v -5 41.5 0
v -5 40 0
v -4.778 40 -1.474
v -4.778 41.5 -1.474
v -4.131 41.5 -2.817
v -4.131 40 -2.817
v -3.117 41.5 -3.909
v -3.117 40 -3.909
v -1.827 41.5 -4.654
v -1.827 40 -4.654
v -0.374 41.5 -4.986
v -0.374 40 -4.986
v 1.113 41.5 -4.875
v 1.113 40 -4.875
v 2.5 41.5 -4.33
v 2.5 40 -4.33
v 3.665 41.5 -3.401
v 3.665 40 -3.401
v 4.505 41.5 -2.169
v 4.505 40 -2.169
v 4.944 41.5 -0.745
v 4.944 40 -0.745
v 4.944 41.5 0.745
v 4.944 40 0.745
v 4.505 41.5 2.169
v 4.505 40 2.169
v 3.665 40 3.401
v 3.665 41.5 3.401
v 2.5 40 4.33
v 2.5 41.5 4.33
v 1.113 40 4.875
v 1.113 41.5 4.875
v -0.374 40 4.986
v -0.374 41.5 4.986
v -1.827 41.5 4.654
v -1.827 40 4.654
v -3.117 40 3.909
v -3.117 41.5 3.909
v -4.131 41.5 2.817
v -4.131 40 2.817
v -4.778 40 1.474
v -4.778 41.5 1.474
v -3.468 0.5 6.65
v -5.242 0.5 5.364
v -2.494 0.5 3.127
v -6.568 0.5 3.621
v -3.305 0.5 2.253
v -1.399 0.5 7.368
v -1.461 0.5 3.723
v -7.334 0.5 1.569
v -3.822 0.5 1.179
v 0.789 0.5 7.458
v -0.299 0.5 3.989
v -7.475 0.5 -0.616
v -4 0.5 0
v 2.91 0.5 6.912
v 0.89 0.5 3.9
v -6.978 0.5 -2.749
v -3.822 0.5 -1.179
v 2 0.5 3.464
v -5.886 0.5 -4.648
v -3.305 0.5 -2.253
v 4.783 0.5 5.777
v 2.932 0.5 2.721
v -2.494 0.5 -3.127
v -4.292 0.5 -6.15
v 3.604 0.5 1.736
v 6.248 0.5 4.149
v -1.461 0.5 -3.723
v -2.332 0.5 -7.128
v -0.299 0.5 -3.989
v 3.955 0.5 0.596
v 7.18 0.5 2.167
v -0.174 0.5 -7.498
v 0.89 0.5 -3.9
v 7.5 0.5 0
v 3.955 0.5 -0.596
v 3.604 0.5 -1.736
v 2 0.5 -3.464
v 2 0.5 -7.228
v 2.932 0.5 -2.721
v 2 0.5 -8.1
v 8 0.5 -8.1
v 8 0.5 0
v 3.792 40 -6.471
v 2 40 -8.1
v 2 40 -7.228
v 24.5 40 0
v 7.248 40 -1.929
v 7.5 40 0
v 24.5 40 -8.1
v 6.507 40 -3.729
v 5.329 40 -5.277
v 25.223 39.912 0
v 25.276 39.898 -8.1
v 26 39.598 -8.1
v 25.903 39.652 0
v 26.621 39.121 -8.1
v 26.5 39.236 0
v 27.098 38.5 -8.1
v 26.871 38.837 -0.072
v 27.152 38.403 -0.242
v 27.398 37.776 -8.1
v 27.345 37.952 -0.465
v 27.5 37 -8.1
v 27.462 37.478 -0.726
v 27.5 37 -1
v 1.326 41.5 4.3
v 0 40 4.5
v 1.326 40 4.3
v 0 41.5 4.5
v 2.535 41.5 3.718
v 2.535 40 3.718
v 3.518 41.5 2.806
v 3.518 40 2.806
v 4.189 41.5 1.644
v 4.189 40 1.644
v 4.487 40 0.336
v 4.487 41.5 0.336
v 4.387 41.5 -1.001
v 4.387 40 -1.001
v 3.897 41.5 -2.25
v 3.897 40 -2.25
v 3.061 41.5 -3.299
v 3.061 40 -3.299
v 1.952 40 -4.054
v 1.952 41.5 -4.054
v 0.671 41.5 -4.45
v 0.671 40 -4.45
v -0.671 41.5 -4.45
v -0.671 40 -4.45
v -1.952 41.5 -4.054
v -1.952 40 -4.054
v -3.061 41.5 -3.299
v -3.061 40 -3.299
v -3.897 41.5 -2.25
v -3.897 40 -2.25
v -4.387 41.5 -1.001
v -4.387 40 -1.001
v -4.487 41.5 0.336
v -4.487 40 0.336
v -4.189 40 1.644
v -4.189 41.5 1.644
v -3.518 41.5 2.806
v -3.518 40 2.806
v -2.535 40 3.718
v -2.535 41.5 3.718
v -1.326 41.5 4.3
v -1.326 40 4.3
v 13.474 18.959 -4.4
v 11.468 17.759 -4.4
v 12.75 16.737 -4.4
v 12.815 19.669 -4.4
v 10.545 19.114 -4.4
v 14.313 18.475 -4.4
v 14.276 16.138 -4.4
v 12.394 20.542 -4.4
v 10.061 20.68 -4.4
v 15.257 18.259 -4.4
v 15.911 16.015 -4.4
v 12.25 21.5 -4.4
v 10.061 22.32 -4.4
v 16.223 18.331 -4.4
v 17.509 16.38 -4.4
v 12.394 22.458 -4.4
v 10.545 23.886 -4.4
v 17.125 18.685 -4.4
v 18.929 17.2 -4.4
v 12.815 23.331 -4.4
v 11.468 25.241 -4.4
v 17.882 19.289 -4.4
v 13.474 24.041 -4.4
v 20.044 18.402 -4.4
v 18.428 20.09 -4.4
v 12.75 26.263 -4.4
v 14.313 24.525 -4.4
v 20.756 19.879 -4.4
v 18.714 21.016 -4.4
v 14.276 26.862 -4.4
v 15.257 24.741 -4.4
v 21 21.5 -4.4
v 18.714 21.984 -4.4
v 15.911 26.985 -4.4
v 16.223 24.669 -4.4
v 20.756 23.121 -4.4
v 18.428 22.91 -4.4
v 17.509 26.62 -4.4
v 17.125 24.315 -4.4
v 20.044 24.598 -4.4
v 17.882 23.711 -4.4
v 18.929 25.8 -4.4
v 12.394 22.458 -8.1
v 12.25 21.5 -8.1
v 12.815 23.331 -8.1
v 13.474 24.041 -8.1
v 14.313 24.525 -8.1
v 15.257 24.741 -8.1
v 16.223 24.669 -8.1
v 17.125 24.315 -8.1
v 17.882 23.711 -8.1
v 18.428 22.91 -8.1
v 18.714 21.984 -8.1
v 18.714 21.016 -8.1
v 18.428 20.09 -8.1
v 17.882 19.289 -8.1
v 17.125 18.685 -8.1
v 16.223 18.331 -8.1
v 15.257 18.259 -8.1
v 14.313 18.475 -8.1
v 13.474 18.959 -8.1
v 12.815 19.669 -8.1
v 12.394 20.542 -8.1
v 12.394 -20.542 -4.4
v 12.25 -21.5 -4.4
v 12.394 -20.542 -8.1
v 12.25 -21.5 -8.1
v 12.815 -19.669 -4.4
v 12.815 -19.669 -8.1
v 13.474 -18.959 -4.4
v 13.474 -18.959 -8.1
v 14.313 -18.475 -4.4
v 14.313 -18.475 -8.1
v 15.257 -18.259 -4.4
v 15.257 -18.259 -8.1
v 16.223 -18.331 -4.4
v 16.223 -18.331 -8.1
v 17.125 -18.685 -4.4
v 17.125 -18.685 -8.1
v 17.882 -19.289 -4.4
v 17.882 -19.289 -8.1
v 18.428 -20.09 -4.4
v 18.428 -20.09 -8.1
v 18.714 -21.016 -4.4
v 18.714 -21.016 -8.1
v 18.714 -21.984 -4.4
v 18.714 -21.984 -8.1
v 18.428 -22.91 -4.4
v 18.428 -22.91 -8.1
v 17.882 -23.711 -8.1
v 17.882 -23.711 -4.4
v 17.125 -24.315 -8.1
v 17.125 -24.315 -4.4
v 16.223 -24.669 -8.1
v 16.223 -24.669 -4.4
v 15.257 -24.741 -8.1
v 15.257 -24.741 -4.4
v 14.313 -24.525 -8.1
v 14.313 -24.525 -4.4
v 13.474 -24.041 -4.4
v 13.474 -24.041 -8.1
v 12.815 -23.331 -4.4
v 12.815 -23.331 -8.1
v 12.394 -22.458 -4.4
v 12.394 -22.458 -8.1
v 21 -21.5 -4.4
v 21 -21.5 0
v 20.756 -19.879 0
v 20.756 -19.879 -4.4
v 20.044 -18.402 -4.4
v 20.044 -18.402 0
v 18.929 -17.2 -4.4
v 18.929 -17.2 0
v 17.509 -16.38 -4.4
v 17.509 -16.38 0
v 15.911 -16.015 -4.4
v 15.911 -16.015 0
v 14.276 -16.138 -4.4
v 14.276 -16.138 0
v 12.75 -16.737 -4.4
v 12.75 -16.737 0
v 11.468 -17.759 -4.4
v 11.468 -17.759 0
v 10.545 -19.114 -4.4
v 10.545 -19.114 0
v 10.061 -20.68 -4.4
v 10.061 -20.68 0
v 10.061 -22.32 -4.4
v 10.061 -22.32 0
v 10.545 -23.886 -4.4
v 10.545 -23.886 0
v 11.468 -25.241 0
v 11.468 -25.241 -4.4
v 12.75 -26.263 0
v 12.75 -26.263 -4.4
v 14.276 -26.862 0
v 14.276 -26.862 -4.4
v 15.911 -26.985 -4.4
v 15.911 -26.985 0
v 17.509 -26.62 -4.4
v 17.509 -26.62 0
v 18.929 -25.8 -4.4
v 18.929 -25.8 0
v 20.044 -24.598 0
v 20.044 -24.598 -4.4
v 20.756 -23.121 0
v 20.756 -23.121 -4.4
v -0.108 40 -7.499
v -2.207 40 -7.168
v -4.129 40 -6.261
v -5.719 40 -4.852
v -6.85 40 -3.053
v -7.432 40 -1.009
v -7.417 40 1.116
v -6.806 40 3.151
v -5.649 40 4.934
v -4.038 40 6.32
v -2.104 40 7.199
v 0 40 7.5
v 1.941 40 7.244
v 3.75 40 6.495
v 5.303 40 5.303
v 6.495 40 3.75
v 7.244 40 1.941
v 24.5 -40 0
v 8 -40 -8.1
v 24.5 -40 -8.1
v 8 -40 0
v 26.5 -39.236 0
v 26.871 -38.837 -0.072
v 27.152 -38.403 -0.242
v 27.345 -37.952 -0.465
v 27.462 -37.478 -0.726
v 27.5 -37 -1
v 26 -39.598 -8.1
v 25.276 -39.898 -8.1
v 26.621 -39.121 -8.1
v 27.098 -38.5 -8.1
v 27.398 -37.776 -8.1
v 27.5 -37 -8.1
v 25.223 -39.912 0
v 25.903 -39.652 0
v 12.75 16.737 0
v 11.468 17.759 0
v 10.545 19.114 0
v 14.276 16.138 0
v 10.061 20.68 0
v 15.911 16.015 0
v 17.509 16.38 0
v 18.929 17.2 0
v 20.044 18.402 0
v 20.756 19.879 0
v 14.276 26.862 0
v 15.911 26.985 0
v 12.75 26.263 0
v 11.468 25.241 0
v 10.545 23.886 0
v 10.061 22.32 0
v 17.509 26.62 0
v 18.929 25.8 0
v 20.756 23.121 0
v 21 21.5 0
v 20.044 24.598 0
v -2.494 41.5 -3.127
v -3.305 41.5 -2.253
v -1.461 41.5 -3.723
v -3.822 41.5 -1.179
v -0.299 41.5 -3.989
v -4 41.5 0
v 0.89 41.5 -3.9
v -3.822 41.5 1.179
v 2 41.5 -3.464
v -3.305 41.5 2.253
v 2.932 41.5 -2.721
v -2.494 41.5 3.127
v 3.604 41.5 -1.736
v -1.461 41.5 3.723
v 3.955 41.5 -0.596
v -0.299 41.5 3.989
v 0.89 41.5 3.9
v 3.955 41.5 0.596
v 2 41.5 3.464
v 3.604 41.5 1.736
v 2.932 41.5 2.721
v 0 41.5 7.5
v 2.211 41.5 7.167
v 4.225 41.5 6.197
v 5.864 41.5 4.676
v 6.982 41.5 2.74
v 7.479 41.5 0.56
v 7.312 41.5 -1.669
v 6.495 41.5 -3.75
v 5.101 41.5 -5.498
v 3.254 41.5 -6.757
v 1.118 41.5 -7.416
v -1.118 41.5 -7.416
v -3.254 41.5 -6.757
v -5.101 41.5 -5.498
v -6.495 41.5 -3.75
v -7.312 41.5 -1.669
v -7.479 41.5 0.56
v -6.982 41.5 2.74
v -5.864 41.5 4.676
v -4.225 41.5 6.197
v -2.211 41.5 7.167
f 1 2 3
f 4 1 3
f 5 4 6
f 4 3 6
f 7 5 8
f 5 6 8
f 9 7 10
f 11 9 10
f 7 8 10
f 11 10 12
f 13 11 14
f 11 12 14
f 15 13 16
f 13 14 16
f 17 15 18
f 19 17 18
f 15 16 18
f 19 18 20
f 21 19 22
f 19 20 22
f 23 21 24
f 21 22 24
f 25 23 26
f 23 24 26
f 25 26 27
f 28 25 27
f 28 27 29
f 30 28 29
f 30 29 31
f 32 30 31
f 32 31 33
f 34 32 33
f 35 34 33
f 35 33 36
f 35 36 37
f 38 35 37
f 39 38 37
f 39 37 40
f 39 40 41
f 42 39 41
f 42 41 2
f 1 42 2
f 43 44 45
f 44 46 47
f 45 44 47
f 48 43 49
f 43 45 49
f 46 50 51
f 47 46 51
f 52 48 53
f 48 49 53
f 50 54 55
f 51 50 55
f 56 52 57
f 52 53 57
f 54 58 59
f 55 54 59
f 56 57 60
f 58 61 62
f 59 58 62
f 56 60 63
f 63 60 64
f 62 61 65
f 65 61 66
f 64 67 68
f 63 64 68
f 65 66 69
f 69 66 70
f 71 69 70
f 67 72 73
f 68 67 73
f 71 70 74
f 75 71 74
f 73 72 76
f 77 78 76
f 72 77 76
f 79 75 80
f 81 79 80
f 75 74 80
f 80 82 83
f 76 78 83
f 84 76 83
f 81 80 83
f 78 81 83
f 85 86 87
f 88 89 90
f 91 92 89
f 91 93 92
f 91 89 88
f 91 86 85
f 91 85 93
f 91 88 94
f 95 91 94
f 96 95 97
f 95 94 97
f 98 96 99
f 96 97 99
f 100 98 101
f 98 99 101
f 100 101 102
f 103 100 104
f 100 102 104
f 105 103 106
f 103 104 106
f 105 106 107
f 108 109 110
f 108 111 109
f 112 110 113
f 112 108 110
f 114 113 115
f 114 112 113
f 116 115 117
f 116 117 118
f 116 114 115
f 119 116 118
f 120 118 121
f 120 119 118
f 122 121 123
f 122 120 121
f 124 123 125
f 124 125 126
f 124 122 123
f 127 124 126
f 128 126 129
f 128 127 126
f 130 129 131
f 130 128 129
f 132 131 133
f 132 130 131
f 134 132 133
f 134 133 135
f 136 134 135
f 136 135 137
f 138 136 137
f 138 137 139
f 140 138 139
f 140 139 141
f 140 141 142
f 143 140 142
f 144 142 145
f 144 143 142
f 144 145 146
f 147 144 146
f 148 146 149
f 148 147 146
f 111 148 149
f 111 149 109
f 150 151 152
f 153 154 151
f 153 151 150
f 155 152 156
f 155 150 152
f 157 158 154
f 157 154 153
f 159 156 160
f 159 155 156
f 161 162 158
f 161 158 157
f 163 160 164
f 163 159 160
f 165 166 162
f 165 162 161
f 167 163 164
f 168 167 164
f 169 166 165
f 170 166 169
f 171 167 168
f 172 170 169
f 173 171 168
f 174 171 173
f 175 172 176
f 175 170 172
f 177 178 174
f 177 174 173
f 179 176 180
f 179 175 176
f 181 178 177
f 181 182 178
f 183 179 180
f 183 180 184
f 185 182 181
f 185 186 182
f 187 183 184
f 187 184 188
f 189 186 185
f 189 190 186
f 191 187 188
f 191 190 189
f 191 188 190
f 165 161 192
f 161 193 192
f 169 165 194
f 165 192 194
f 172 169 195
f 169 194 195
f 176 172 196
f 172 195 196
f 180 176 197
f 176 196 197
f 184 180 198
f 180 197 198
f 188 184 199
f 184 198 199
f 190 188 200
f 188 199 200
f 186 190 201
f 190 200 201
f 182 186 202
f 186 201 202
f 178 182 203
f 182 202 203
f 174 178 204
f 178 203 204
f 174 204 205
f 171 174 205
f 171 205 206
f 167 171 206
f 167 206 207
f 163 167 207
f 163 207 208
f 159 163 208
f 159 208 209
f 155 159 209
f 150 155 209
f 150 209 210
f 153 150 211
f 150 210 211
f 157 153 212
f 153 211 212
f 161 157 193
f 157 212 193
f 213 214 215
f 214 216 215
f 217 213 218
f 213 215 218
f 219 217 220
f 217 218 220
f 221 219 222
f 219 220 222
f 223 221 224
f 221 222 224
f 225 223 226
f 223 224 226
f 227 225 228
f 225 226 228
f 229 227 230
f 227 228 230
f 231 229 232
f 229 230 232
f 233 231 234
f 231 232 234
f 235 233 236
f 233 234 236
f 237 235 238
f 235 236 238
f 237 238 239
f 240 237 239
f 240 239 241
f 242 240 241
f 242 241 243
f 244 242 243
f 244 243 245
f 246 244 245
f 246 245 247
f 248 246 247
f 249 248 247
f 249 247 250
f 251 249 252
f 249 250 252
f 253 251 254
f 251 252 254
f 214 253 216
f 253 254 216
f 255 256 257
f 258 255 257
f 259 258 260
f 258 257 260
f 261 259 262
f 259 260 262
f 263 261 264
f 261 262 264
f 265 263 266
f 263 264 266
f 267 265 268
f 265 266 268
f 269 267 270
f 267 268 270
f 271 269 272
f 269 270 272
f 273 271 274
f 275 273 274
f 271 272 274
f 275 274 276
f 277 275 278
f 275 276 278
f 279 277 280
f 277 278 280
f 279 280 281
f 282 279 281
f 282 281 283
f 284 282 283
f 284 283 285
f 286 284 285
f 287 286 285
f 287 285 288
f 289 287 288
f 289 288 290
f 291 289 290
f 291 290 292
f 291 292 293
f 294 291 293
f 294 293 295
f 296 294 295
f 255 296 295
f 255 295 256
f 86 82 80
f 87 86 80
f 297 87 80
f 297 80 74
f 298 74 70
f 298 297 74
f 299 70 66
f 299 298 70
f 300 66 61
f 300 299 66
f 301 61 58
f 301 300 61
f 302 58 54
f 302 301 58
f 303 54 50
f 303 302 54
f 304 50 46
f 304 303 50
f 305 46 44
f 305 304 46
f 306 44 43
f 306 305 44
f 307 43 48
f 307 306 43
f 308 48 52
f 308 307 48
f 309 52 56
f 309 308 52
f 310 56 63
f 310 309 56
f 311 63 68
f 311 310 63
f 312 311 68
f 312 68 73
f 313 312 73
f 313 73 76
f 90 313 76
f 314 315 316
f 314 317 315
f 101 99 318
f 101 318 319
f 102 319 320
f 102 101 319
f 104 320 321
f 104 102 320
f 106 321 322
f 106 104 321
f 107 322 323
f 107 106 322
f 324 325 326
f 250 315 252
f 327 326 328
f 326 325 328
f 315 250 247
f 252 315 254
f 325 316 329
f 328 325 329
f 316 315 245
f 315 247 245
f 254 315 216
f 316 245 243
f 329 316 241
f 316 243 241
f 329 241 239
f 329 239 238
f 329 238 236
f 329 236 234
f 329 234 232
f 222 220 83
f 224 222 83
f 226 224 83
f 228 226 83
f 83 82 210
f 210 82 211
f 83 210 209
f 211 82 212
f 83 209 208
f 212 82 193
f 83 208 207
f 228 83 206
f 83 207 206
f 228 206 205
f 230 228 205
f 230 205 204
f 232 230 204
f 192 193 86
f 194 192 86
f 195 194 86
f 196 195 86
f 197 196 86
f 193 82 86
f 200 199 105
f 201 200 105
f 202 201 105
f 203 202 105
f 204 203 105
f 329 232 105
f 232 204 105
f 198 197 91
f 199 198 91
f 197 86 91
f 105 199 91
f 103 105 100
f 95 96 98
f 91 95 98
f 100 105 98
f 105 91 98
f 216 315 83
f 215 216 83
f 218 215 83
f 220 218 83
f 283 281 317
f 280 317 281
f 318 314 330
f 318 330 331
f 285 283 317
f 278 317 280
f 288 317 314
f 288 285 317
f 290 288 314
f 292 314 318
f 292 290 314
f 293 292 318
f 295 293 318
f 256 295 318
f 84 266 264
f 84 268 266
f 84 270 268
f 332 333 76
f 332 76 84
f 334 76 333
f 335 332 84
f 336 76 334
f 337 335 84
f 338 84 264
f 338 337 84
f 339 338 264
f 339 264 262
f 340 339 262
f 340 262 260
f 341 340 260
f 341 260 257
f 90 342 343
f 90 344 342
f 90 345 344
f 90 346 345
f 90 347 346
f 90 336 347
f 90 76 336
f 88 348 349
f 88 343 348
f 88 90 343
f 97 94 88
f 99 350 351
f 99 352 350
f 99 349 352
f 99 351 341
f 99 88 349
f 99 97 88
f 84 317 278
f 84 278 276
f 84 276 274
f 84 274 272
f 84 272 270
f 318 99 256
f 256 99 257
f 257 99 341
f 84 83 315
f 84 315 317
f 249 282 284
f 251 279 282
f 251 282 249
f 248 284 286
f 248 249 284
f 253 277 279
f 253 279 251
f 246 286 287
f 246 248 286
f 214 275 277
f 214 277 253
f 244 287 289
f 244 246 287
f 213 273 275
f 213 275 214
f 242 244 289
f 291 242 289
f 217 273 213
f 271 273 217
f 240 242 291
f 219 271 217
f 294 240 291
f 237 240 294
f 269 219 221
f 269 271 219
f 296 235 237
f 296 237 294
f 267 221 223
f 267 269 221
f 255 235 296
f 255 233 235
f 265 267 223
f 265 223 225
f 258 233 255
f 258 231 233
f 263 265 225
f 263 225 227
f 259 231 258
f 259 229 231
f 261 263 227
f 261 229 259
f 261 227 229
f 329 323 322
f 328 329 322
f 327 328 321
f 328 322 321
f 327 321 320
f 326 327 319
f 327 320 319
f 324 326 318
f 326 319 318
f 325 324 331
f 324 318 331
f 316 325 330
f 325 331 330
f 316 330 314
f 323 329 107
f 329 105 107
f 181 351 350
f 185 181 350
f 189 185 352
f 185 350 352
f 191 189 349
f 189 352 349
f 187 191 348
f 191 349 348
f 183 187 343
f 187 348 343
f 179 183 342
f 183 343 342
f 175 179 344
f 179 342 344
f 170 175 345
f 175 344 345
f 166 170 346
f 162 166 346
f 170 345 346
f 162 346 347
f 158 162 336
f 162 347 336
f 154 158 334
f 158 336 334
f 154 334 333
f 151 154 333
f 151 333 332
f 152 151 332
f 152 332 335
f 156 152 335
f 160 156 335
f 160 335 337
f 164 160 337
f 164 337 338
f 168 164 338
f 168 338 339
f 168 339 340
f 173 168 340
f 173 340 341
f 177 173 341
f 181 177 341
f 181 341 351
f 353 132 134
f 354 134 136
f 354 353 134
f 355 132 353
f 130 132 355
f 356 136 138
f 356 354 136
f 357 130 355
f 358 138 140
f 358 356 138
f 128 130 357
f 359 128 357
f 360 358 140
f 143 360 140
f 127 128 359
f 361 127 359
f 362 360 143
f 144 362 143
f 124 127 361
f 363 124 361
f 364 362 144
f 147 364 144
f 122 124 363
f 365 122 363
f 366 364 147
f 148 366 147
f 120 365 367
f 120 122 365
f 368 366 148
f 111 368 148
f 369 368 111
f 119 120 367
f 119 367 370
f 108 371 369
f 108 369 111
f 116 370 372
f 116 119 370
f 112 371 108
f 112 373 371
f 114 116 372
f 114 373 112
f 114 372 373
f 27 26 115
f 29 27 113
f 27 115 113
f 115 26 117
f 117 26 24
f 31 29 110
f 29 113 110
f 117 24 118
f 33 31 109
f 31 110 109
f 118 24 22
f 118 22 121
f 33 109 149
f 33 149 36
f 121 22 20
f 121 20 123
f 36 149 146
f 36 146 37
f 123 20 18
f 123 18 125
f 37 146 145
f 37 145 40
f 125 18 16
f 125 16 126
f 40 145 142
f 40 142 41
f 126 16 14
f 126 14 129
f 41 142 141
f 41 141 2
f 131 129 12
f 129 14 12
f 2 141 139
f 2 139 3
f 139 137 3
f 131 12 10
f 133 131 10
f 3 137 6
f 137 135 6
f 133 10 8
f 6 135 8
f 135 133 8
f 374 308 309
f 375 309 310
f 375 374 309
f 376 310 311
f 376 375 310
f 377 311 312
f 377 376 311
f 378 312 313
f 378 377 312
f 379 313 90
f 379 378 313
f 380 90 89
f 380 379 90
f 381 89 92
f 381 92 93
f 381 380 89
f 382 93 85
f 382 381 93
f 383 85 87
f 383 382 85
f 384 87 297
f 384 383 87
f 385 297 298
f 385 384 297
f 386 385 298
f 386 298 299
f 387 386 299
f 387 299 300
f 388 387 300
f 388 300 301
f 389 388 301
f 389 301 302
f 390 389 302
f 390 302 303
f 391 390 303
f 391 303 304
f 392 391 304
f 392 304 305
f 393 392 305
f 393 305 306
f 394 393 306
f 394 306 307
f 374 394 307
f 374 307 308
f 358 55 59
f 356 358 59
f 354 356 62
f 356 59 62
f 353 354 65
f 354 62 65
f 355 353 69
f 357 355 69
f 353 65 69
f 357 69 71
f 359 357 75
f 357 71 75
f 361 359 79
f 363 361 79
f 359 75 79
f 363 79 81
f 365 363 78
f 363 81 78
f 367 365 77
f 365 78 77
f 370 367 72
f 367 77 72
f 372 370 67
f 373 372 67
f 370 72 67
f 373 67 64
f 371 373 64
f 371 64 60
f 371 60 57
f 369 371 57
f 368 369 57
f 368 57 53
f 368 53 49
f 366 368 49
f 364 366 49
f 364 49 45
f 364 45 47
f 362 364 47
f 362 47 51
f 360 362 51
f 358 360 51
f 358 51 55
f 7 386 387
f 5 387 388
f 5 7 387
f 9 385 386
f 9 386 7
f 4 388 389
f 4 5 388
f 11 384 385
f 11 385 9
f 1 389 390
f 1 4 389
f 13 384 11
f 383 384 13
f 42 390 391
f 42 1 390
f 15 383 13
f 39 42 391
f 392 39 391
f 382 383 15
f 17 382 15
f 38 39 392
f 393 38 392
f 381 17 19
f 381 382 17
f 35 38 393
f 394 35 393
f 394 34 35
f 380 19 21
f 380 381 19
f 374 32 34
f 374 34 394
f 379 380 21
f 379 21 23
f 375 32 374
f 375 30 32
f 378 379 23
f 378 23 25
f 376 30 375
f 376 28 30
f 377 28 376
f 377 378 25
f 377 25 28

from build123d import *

# Parameters (mm, degrees)
EXTRUDE1_DEPTH       = 39.5
SKETCH2_W            = 19.5
SKETCH2_H            = 8.1
EXTRUDE2_DEPTH       = 40.5
EXTRUDE3_START       = 1.5
SKETCH3_R            = 7.5
EXTRUDE3_DEPTH       = 1.5
HOLEWZD1_D           = 10
HOLEWZD1_DEPTH       = 1.5
SKETCH6_W            = 4.5
SKETCH6_H            = 1.5
HOLEWZD2_D           = 8
HOLEWZD2_DEPTH       = 81.500025
HOLEWZD3_D           = 6.5
HOLEWZD3_CBORE_D     = 11
HOLEWZD3_CBORE_DEPTH = 4.4
FILLET1_R            = 1
FILLET2_R            = 3


with BuildPart() as part:
    # Sketch1 → Extrude1 (new body)
    with BuildSketch(Plane(origin=(0, 40, 0), x_dir=(1, 0, 0), z_dir=(0, 1, 0))):
        with BuildLine():
            Line((27.5, 8.1), (2, 8.1))
            Line((2, 8.1), (2, 7.228416147))
            ThreePointArc((2, 7.228416147), (-5.968668193, -4.541475531), (7.5, 0))
            Line((7.5, 0), (27.5, 0))
            Line((27.5, 0), (27.5, 8.1))
        make_face()
    extrude(amount=-EXTRUDE1_DEPTH)

    # Sketch2 → Extrude2 (add)
    with BuildSketch(Plane.XZ.offset(-0.5)):
        with Locations((17.75, -4.05)):
            Rectangle(SKETCH2_W, SKETCH2_H)
    extrude(amount=EXTRUDE2_DEPTH)

    # Sketch3 → Extrude3 (add)
    with BuildSketch(Plane(origin=(0, 40, 0), x_dir=(-1, 0, 0), z_dir=(0, 1, 0)).offset(EXTRUDE3_START)):
        with Locations(Location((0, 0, 0), (0, 0, 90))):
            Circle(SKETCH3_R)
    extrude(amount=-EXTRUDE3_DEPTH)

    # HoleWzd1
    with Locations(Plane(origin=(0, 41.5, 0), x_dir=(1, 0, 0), z_dir=(0, 1, 0))):
        with Locations((0, 0)):
            Hole(HOLEWZD1_D / 2, depth=HOLEWZD1_DEPTH)

    # Sketch6 → Revolve1 (revolve)
    with BuildSketch(Plane(origin=(0, 0, 0), x_dir=(-1, 0, 0), z_dir=(0, 0, -1)), mode=Mode.PRIVATE) as revolve1_sk:
        with Locations((-2.25, 40.75)):
            Rectangle(SKETCH6_W, SKETCH6_H)
    revolve(revolve1_sk.sketch.rotate(Axis((0, 40, 0), (0, 1, 0)), 270), axis=Axis((0, 40, 0), (0, 1, 0)))

    # HoleWzd2
    with Locations(Plane(origin=(0, 41.5, 0), x_dir=(1, 0, 0), z_dir=(0, 1, 0))):
        with Locations((0, 0)):
            Hole(HOLEWZD2_D / 2, depth=HOLEWZD2_DEPTH)

    # HoleWzd3 (through all)
    with Locations(Plane.XY):
        with Locations((15.5, 21.5), (15.5, -21.5)):
            CounterBoreHole(HOLEWZD3_D / 2, HOLEWZD3_CBORE_D / 2, HOLEWZD3_CBORE_DEPTH)

    # Fillet1
    fillet1_edges = [part.edges().sort_by_distance(p)[0] for p in [
        (27.5, 0, 0),
    ]]
    fillet(fillet1_edges, radius=FILLET1_R)

    # Fillet2
    # the kernel refuses this fillet: 3 mm, written as the material it takes off along each edge
    with BuildSketch(Plane(origin=(27.5, 40, 6.5), x_dir=(-1, 0, 0), z_dir=(0, 0, -1))) as fillet2_piece_1:
        with BuildLine():
            CenterArc((FILLET2_R, -FILLET2_R), FILLET2_R, 90, 90)
            Line((0, -FILLET2_R), (0, 0))
            Line((0, 0), (FILLET2_R, 0))
        make_face()
    extrude(amount=22.1, mode=Mode.SUBTRACT)
    with BuildSketch(Plane(origin=(27.5, -40, 6.5), x_dir=(-1, 0, 0), z_dir=(0, 0, -1))) as fillet2_piece_2:
        with BuildLine():
            CenterArc((FILLET2_R, FILLET2_R), FILLET2_R, 180, 90)
            Line((0, FILLET2_R), (0, 0))
            Line((0, 0), (FILLET2_R, 0))
        make_face()
    extrude(amount=22.1, mode=Mode.SUBTRACT)


solid = part.part
